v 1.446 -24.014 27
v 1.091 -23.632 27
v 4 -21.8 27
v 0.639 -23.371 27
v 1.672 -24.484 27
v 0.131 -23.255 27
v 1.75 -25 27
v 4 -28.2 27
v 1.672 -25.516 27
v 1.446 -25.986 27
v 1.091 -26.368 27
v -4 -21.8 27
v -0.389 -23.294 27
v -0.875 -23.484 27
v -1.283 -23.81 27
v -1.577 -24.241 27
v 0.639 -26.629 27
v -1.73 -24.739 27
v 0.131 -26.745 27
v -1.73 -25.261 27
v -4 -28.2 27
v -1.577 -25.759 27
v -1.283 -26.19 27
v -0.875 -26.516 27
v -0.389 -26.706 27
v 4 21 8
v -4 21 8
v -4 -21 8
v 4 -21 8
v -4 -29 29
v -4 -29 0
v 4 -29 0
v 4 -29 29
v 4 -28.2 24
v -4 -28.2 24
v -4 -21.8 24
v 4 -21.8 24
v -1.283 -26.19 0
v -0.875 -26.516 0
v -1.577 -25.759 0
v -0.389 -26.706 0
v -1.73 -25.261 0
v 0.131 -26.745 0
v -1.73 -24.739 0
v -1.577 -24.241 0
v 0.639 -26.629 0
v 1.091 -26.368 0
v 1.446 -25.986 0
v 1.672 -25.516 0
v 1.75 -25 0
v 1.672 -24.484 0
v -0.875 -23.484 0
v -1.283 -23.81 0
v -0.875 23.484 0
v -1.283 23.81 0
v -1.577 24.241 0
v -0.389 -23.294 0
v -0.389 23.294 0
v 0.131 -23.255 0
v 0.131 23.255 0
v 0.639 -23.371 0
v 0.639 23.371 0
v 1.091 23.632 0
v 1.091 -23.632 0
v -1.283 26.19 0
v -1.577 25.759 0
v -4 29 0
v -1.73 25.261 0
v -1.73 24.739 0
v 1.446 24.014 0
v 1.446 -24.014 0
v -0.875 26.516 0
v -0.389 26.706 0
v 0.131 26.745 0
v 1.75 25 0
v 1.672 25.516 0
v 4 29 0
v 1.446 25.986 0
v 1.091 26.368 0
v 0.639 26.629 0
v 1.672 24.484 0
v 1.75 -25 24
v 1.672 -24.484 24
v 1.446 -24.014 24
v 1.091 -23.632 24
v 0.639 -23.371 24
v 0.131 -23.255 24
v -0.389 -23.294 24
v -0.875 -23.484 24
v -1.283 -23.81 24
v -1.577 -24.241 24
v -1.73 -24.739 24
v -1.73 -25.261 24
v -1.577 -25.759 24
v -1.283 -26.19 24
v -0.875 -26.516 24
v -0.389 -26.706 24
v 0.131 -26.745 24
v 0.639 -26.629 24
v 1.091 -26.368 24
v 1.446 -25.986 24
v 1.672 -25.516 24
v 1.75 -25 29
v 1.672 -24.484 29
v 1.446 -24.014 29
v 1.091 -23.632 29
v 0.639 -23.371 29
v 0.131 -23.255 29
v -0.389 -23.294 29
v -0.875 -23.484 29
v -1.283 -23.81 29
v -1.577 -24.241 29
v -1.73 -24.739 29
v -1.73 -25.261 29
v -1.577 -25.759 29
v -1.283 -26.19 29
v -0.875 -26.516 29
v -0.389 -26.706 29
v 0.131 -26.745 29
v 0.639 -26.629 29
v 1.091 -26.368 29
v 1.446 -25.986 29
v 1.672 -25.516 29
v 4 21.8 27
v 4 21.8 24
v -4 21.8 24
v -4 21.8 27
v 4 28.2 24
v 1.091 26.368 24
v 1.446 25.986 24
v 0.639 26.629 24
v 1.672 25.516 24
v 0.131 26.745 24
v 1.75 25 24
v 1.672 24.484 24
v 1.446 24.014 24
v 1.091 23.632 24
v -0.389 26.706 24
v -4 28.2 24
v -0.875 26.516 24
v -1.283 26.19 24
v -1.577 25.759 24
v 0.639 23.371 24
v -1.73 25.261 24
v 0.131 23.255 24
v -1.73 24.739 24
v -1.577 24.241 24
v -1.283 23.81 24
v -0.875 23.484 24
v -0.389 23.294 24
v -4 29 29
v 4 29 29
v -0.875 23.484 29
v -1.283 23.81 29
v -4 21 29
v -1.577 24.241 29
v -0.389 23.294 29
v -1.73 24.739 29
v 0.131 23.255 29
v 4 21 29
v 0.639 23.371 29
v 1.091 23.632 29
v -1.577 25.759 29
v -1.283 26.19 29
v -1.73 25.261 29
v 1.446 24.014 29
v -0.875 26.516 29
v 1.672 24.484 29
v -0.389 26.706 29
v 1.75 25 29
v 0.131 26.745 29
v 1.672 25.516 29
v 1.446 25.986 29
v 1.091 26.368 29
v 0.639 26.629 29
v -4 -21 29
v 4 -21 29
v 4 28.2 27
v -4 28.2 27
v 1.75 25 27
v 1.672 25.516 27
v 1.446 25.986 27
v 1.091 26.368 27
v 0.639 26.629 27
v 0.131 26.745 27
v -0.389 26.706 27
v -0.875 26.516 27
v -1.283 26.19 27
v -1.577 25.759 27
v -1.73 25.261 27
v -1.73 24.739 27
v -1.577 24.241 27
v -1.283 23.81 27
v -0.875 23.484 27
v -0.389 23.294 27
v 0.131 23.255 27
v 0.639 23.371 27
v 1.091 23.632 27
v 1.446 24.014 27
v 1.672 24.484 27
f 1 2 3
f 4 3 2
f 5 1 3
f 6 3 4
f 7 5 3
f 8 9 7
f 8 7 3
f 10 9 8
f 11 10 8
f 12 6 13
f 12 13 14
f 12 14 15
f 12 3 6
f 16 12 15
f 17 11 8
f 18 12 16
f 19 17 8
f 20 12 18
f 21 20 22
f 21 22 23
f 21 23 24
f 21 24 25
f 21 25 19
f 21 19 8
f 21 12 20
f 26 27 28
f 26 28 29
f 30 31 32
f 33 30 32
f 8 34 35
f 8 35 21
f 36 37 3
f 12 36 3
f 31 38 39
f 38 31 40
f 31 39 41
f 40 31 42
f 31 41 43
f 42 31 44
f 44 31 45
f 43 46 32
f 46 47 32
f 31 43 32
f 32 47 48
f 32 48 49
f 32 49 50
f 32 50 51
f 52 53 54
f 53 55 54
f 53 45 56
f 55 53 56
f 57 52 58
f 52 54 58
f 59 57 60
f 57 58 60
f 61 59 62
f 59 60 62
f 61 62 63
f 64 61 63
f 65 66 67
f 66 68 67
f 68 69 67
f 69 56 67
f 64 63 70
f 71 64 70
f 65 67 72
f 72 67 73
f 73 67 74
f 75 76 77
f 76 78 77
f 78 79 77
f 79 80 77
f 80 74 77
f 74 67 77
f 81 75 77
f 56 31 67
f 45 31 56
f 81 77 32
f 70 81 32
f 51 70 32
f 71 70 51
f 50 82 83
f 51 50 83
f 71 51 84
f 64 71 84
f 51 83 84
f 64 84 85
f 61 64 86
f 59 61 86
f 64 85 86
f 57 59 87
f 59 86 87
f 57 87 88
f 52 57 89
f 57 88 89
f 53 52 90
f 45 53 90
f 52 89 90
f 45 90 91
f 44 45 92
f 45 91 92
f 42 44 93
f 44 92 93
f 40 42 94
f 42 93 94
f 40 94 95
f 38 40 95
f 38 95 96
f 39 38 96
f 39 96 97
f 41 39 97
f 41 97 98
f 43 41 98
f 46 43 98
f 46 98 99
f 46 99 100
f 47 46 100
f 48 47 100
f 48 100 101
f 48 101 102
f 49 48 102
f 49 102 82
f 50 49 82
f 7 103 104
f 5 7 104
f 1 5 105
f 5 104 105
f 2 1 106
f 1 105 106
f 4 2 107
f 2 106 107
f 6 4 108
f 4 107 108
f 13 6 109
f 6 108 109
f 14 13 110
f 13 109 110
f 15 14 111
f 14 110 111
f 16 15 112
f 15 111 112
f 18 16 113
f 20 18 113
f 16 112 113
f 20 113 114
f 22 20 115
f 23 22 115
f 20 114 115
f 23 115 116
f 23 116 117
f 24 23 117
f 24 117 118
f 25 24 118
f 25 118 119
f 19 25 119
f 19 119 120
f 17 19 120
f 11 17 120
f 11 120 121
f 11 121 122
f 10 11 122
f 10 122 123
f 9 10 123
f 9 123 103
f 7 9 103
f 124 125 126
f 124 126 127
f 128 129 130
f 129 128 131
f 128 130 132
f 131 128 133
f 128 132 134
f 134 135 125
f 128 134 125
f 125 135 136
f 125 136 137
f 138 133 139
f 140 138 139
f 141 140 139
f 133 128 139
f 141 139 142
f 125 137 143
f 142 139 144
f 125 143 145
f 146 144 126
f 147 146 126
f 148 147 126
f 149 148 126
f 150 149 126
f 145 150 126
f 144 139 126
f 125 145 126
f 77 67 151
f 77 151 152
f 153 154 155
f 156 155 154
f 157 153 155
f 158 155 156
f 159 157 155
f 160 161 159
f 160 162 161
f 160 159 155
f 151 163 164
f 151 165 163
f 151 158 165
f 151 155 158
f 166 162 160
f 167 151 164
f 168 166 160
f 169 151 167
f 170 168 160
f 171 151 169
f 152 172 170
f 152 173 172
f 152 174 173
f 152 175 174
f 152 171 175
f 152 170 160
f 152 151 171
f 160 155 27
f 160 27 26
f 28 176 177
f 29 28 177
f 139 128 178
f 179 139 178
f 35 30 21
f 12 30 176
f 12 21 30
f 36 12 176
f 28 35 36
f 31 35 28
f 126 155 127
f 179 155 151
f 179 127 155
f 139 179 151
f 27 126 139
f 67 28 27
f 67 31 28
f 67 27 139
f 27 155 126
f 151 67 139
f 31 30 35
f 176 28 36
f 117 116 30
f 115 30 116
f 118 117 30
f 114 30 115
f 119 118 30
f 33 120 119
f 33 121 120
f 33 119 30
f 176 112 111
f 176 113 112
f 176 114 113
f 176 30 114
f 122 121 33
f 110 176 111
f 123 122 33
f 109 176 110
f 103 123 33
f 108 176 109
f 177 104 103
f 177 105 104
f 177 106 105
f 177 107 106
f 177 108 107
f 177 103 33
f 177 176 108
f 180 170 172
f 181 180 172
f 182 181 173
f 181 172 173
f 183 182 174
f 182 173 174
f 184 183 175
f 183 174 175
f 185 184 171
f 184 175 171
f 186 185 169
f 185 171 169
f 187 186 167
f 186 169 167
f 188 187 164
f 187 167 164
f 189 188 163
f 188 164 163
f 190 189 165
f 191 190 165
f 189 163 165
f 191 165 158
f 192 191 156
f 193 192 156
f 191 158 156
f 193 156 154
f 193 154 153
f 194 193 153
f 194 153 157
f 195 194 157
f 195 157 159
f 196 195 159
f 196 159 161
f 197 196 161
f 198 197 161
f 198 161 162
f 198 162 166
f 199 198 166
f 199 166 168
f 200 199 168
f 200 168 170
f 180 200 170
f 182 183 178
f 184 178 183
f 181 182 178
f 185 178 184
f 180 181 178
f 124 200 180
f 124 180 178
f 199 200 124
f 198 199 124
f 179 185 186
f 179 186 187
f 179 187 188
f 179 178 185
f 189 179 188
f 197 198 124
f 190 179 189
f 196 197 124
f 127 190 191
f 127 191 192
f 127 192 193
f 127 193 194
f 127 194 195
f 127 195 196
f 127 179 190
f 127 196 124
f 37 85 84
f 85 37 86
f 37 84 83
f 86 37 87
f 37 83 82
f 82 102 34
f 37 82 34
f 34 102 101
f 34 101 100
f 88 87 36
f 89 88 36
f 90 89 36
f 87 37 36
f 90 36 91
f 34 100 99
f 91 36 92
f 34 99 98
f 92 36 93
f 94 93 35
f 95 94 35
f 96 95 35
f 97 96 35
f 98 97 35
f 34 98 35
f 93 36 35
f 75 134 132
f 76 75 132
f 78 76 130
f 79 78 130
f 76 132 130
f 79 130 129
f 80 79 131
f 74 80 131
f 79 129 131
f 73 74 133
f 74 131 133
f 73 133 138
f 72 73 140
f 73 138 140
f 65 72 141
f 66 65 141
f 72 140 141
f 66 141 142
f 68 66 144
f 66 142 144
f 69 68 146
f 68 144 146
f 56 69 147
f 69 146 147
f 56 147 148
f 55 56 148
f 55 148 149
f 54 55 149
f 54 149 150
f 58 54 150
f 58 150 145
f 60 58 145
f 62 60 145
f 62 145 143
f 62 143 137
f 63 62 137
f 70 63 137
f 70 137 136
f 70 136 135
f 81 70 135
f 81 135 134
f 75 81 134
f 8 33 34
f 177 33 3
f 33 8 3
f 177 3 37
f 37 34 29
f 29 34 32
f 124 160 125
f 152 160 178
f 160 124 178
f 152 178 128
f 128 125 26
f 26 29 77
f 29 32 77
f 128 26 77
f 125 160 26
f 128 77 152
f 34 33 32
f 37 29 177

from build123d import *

# Parameters (mm, degrees)
F1_W     = 8
F1_H     = 58
F2_DEPTH = 8
F3_W     = 8
F3_H     = 8
F4_DEPTH = 21
F5_R     = 1.75
F6_DEPTH = 30
F7_W     = 6.4
F7_H     = 3
F8_DEPTH = 25
F9_DEPTH = 30


# Not quite as in the source:
# - a feature names something its author has since deleted; it is built from what else it names


with BuildPart() as f2:
    # F1 (on Top) → F2 (new body)
    with BuildSketch(Plane.XY):
        Rectangle(F1_W, F1_H)
    extrude(amount=F2_DEPTH)

    # F3 (on face) → F4 (join)
    with BuildSketch(Plane.XY.offset(8)):
        with Locations((0, 25)):
            Rectangle(F3_W, F3_H)
        with Locations((0, -25)):
            Rectangle(F3_W, F3_H)
    extrude(amount=F4_DEPTH)

    # F5 (on face) → F6 (cut)
    with BuildSketch(Plane.XY.offset(29)):
        with Locations((0, 25)):
            Circle(F5_R)
    extrude(amount=-F6_DEPTH, mode=Mode.SUBTRACT)

    # F7 (on face) → F8 (cut)
    with BuildSketch(Plane(origin=(-4, 0, 0), x_dir=(0, -1, 0), z_dir=(-1, 0, 0))):
        with Locations((-25, 25.5)):
            Rectangle(F7_W, F7_H)
        with Locations((25, 25.5)):
            Rectangle(F7_W, F7_H)
    extrude(amount=-F8_DEPTH, mode=Mode.SUBTRACT)

    # F5 (on face) → F9 (cut)
    with BuildSketch(Plane.XY.offset(29)):
        with Locations((0, 25)):
            Circle(F5_R)
        with Locations((0, -25)):
            Circle(F5_R)
    extrude(amount=-F9_DEPTH, mode=Mode.SUBTRACT)


solid = f2.part
